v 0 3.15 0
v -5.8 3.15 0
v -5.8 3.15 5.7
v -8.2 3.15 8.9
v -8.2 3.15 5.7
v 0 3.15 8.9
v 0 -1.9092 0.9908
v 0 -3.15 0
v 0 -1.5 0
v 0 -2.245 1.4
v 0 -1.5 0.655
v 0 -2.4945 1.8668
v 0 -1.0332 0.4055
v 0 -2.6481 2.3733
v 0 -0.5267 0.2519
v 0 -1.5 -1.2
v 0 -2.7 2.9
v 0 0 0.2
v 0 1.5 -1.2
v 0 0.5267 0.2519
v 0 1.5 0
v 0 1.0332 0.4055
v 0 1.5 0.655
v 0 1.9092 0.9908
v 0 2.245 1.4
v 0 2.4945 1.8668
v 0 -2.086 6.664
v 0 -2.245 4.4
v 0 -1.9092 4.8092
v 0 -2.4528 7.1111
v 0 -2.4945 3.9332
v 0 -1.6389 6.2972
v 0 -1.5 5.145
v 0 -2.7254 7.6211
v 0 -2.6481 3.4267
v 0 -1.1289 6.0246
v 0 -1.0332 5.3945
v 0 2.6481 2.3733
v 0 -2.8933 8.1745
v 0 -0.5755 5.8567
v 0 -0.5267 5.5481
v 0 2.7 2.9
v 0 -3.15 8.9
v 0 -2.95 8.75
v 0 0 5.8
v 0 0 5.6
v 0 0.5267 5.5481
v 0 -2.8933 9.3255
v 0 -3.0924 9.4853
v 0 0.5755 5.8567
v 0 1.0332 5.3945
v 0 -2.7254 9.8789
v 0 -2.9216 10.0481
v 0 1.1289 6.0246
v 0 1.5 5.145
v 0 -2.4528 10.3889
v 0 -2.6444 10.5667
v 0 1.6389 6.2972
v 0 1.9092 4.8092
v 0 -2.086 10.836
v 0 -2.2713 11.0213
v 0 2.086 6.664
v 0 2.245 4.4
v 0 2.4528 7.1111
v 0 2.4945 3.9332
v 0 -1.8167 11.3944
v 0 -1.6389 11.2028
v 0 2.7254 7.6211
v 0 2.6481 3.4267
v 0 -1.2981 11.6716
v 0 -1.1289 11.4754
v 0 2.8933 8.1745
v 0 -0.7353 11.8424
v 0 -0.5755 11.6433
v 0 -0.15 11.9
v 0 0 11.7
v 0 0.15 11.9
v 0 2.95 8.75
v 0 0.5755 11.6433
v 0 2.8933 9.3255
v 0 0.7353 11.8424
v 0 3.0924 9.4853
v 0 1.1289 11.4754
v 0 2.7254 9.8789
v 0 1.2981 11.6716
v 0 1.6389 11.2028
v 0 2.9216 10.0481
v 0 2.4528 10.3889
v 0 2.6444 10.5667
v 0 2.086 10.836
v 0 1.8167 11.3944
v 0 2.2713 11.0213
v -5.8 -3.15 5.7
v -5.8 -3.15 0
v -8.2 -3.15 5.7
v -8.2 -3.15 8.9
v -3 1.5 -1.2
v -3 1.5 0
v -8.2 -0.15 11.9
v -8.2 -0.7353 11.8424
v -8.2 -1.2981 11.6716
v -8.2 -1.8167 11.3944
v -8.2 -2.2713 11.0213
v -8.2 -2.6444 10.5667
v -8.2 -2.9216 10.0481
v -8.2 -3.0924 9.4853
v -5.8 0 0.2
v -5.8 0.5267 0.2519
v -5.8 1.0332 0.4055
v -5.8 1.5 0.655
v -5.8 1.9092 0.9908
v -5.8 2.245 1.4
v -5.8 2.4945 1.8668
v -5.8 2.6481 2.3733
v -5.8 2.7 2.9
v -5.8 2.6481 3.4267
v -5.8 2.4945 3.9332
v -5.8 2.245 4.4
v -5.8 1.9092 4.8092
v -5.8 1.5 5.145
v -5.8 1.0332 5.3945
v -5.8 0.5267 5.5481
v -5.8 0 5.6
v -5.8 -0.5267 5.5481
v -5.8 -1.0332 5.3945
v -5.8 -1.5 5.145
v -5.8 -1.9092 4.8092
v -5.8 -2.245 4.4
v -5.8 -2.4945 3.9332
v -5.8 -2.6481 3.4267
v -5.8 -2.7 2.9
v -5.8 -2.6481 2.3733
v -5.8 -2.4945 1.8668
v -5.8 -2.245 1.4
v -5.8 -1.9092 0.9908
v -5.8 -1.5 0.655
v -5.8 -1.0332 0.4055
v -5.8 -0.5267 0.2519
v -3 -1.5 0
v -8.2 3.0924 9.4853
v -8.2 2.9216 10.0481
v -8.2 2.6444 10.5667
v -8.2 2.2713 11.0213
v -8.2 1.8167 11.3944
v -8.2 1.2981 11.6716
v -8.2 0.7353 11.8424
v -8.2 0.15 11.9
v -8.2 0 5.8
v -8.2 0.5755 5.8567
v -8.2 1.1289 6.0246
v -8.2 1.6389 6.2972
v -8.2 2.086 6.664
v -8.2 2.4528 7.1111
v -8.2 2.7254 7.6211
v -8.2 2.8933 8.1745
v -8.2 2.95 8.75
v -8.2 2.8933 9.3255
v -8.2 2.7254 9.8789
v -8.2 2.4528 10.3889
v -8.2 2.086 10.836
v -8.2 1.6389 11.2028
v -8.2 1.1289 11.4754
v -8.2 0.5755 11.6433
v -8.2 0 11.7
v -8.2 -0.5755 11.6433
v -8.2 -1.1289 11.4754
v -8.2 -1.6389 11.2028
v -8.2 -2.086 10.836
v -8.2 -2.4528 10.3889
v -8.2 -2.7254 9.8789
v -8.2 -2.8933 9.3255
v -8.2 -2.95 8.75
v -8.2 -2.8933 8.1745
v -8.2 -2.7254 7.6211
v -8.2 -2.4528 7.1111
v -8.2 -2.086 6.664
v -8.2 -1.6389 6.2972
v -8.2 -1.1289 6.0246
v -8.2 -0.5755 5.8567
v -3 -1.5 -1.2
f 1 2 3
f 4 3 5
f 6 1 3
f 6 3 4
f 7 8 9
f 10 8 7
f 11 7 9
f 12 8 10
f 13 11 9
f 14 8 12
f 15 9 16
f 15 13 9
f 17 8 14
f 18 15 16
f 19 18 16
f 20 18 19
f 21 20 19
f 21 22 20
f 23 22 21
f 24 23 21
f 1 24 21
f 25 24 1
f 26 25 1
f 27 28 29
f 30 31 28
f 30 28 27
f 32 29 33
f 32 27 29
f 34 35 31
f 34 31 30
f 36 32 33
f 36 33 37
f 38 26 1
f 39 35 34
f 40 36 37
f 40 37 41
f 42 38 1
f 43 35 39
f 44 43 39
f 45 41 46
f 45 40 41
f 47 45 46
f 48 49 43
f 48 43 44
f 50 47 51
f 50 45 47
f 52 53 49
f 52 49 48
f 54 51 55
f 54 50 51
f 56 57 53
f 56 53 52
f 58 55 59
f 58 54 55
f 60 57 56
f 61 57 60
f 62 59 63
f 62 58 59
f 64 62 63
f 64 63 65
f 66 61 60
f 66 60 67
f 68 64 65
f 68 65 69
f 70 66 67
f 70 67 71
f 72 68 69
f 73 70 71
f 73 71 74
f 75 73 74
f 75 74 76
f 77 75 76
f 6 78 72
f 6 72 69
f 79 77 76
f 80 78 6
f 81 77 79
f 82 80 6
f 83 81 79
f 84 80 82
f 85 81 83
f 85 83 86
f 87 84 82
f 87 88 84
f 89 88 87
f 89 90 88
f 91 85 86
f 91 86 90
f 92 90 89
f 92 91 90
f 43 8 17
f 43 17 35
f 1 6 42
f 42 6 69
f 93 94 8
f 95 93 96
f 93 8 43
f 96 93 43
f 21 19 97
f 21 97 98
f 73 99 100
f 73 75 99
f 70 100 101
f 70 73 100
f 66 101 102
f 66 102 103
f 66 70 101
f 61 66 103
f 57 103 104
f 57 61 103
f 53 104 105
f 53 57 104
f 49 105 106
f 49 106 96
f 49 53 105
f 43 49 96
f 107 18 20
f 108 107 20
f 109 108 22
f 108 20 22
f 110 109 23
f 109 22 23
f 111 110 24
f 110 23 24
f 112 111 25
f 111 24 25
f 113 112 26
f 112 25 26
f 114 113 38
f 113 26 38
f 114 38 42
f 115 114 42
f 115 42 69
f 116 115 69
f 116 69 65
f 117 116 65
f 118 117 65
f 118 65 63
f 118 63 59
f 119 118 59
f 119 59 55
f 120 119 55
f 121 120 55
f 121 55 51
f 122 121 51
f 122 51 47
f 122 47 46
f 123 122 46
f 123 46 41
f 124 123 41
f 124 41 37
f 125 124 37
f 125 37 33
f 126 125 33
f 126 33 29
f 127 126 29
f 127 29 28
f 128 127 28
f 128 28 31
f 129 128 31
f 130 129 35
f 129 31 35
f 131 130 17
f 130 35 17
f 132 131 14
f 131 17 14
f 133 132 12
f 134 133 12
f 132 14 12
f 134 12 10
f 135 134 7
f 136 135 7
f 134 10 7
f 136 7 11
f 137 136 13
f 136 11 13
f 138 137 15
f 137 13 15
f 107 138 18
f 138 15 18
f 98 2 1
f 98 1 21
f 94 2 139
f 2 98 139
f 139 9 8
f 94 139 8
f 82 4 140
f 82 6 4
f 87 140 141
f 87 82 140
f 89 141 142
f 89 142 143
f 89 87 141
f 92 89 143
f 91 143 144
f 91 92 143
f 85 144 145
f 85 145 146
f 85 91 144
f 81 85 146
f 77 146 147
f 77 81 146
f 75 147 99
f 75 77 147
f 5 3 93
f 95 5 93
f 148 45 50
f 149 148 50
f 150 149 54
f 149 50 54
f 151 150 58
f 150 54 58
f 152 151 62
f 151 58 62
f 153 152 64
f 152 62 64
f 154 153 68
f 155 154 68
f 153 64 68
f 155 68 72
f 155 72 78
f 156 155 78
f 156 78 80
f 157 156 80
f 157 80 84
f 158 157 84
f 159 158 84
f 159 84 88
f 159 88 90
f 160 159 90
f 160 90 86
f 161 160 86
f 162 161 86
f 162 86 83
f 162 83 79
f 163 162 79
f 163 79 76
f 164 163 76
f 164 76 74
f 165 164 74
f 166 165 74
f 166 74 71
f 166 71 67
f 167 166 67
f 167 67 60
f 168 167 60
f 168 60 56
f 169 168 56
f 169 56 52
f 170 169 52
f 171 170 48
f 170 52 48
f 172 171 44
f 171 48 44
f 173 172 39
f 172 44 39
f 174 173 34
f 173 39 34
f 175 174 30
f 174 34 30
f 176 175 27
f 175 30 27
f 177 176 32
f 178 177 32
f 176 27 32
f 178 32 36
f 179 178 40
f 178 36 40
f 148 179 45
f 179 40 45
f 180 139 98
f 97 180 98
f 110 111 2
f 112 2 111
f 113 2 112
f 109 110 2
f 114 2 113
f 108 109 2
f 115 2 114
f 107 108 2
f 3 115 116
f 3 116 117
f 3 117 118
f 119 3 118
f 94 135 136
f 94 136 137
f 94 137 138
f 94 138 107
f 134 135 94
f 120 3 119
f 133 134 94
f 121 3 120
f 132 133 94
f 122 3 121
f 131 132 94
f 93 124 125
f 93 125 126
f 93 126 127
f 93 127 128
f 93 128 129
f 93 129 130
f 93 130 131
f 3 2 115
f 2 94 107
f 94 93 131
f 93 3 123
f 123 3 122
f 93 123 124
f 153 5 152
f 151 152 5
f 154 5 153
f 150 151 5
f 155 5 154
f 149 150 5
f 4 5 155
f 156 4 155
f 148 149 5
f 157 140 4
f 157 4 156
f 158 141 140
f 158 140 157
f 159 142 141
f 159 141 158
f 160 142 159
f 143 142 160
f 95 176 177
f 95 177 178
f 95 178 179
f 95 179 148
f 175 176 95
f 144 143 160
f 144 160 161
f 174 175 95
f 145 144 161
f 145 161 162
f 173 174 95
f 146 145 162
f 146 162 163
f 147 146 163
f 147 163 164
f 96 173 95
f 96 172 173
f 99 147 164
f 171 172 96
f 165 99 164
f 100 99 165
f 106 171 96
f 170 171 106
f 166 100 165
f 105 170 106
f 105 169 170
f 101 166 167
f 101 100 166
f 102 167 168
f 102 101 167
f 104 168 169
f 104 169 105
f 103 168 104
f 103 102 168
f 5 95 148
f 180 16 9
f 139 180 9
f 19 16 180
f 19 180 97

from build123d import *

# Parameters (mm, degrees)
SKETCH_1_W          = 6.3
SKETCH_1_H          = 11.9
SKETCH_1_W_2        = 3
SKETCH_1_H_2        = 1.2
EXTRUDE_2_DEPTH     = 3
SKETCH_7_W          = 6.3
SKETCH_7_H          = 5.7
EXTRUDE_4_DEPTH     = 2.8
SKETCH_8_W          = 6.3
SKETCH_8_H          = 6.2
EXTRUDE_5_DEPTH     = 5.2
SKETCH_5_R          = 2.7
SKETCH_5_R_2        = 2.95
CUT_EXTRUDE_3_DEPTH = 15.790960077
FILLET_1_R          = 3


with BuildPart() as part:
    # ｽｹｯﾁ1 → ﾎﾞｽ - 押し出し2 (new body)
    with BuildSketch(Plane.YZ):
        with Locations((0, 5.95)):
            Rectangle(SKETCH_1_W, SKETCH_1_H)
        with Locations((0, -0.6)):
            Rectangle(SKETCH_1_W_2, SKETCH_1_H_2)
    extrude(amount=-EXTRUDE_2_DEPTH)

    # ｽｹｯﾁ7 → ﾎﾞｽ - 押し出し4 (add)
    with BuildSketch(Plane(origin=(-3, 0, 0), x_dir=(0, -1, 0), z_dir=(-1, 0, 0))):
        with Locations((0, 2.85)):
            Rectangle(SKETCH_7_W, SKETCH_7_H)
    extrude(amount=EXTRUDE_4_DEPTH)

    # ｽｹｯﾁ8 → ﾎﾞｽ - 押し出し5 (add)
    with BuildSketch(Plane(origin=(-3, 0, 0), x_dir=(0, -1, 0), z_dir=(-1, 0, 0))):
        with Locations((0, 8.8)):
            Rectangle(SKETCH_8_W, SKETCH_8_H)
    extrude(amount=EXTRUDE_5_DEPTH)

    # ｽｹｯﾁ5 → ｶｯﾄ - 押し出し3 (cut, through all)
    with BuildSketch(Plane.YZ):
        with Locations(Location((0, 2.9, 0), (0, 0, 270))):
            Circle(SKETCH_5_R)
        with Locations(Location((0, 8.75, 0), (0, 0, 270))):
            Circle(SKETCH_5_R_2)
    extrude(amount=-CUT_EXTRUDE_3_DEPTH, mode=Mode.SUBTRACT)

    # ﾌｨﾚｯﾄ1
    fillet_1_edges = [part.edges().sort_by_distance(p)[0] for p in [
        (-4.1, -3.15, 11.9),
        (-4.1, 3.15, 11.9),
    ]]
    fillet(fillet_1_edges, radius=FILLET_1_R)


solid = part.part
